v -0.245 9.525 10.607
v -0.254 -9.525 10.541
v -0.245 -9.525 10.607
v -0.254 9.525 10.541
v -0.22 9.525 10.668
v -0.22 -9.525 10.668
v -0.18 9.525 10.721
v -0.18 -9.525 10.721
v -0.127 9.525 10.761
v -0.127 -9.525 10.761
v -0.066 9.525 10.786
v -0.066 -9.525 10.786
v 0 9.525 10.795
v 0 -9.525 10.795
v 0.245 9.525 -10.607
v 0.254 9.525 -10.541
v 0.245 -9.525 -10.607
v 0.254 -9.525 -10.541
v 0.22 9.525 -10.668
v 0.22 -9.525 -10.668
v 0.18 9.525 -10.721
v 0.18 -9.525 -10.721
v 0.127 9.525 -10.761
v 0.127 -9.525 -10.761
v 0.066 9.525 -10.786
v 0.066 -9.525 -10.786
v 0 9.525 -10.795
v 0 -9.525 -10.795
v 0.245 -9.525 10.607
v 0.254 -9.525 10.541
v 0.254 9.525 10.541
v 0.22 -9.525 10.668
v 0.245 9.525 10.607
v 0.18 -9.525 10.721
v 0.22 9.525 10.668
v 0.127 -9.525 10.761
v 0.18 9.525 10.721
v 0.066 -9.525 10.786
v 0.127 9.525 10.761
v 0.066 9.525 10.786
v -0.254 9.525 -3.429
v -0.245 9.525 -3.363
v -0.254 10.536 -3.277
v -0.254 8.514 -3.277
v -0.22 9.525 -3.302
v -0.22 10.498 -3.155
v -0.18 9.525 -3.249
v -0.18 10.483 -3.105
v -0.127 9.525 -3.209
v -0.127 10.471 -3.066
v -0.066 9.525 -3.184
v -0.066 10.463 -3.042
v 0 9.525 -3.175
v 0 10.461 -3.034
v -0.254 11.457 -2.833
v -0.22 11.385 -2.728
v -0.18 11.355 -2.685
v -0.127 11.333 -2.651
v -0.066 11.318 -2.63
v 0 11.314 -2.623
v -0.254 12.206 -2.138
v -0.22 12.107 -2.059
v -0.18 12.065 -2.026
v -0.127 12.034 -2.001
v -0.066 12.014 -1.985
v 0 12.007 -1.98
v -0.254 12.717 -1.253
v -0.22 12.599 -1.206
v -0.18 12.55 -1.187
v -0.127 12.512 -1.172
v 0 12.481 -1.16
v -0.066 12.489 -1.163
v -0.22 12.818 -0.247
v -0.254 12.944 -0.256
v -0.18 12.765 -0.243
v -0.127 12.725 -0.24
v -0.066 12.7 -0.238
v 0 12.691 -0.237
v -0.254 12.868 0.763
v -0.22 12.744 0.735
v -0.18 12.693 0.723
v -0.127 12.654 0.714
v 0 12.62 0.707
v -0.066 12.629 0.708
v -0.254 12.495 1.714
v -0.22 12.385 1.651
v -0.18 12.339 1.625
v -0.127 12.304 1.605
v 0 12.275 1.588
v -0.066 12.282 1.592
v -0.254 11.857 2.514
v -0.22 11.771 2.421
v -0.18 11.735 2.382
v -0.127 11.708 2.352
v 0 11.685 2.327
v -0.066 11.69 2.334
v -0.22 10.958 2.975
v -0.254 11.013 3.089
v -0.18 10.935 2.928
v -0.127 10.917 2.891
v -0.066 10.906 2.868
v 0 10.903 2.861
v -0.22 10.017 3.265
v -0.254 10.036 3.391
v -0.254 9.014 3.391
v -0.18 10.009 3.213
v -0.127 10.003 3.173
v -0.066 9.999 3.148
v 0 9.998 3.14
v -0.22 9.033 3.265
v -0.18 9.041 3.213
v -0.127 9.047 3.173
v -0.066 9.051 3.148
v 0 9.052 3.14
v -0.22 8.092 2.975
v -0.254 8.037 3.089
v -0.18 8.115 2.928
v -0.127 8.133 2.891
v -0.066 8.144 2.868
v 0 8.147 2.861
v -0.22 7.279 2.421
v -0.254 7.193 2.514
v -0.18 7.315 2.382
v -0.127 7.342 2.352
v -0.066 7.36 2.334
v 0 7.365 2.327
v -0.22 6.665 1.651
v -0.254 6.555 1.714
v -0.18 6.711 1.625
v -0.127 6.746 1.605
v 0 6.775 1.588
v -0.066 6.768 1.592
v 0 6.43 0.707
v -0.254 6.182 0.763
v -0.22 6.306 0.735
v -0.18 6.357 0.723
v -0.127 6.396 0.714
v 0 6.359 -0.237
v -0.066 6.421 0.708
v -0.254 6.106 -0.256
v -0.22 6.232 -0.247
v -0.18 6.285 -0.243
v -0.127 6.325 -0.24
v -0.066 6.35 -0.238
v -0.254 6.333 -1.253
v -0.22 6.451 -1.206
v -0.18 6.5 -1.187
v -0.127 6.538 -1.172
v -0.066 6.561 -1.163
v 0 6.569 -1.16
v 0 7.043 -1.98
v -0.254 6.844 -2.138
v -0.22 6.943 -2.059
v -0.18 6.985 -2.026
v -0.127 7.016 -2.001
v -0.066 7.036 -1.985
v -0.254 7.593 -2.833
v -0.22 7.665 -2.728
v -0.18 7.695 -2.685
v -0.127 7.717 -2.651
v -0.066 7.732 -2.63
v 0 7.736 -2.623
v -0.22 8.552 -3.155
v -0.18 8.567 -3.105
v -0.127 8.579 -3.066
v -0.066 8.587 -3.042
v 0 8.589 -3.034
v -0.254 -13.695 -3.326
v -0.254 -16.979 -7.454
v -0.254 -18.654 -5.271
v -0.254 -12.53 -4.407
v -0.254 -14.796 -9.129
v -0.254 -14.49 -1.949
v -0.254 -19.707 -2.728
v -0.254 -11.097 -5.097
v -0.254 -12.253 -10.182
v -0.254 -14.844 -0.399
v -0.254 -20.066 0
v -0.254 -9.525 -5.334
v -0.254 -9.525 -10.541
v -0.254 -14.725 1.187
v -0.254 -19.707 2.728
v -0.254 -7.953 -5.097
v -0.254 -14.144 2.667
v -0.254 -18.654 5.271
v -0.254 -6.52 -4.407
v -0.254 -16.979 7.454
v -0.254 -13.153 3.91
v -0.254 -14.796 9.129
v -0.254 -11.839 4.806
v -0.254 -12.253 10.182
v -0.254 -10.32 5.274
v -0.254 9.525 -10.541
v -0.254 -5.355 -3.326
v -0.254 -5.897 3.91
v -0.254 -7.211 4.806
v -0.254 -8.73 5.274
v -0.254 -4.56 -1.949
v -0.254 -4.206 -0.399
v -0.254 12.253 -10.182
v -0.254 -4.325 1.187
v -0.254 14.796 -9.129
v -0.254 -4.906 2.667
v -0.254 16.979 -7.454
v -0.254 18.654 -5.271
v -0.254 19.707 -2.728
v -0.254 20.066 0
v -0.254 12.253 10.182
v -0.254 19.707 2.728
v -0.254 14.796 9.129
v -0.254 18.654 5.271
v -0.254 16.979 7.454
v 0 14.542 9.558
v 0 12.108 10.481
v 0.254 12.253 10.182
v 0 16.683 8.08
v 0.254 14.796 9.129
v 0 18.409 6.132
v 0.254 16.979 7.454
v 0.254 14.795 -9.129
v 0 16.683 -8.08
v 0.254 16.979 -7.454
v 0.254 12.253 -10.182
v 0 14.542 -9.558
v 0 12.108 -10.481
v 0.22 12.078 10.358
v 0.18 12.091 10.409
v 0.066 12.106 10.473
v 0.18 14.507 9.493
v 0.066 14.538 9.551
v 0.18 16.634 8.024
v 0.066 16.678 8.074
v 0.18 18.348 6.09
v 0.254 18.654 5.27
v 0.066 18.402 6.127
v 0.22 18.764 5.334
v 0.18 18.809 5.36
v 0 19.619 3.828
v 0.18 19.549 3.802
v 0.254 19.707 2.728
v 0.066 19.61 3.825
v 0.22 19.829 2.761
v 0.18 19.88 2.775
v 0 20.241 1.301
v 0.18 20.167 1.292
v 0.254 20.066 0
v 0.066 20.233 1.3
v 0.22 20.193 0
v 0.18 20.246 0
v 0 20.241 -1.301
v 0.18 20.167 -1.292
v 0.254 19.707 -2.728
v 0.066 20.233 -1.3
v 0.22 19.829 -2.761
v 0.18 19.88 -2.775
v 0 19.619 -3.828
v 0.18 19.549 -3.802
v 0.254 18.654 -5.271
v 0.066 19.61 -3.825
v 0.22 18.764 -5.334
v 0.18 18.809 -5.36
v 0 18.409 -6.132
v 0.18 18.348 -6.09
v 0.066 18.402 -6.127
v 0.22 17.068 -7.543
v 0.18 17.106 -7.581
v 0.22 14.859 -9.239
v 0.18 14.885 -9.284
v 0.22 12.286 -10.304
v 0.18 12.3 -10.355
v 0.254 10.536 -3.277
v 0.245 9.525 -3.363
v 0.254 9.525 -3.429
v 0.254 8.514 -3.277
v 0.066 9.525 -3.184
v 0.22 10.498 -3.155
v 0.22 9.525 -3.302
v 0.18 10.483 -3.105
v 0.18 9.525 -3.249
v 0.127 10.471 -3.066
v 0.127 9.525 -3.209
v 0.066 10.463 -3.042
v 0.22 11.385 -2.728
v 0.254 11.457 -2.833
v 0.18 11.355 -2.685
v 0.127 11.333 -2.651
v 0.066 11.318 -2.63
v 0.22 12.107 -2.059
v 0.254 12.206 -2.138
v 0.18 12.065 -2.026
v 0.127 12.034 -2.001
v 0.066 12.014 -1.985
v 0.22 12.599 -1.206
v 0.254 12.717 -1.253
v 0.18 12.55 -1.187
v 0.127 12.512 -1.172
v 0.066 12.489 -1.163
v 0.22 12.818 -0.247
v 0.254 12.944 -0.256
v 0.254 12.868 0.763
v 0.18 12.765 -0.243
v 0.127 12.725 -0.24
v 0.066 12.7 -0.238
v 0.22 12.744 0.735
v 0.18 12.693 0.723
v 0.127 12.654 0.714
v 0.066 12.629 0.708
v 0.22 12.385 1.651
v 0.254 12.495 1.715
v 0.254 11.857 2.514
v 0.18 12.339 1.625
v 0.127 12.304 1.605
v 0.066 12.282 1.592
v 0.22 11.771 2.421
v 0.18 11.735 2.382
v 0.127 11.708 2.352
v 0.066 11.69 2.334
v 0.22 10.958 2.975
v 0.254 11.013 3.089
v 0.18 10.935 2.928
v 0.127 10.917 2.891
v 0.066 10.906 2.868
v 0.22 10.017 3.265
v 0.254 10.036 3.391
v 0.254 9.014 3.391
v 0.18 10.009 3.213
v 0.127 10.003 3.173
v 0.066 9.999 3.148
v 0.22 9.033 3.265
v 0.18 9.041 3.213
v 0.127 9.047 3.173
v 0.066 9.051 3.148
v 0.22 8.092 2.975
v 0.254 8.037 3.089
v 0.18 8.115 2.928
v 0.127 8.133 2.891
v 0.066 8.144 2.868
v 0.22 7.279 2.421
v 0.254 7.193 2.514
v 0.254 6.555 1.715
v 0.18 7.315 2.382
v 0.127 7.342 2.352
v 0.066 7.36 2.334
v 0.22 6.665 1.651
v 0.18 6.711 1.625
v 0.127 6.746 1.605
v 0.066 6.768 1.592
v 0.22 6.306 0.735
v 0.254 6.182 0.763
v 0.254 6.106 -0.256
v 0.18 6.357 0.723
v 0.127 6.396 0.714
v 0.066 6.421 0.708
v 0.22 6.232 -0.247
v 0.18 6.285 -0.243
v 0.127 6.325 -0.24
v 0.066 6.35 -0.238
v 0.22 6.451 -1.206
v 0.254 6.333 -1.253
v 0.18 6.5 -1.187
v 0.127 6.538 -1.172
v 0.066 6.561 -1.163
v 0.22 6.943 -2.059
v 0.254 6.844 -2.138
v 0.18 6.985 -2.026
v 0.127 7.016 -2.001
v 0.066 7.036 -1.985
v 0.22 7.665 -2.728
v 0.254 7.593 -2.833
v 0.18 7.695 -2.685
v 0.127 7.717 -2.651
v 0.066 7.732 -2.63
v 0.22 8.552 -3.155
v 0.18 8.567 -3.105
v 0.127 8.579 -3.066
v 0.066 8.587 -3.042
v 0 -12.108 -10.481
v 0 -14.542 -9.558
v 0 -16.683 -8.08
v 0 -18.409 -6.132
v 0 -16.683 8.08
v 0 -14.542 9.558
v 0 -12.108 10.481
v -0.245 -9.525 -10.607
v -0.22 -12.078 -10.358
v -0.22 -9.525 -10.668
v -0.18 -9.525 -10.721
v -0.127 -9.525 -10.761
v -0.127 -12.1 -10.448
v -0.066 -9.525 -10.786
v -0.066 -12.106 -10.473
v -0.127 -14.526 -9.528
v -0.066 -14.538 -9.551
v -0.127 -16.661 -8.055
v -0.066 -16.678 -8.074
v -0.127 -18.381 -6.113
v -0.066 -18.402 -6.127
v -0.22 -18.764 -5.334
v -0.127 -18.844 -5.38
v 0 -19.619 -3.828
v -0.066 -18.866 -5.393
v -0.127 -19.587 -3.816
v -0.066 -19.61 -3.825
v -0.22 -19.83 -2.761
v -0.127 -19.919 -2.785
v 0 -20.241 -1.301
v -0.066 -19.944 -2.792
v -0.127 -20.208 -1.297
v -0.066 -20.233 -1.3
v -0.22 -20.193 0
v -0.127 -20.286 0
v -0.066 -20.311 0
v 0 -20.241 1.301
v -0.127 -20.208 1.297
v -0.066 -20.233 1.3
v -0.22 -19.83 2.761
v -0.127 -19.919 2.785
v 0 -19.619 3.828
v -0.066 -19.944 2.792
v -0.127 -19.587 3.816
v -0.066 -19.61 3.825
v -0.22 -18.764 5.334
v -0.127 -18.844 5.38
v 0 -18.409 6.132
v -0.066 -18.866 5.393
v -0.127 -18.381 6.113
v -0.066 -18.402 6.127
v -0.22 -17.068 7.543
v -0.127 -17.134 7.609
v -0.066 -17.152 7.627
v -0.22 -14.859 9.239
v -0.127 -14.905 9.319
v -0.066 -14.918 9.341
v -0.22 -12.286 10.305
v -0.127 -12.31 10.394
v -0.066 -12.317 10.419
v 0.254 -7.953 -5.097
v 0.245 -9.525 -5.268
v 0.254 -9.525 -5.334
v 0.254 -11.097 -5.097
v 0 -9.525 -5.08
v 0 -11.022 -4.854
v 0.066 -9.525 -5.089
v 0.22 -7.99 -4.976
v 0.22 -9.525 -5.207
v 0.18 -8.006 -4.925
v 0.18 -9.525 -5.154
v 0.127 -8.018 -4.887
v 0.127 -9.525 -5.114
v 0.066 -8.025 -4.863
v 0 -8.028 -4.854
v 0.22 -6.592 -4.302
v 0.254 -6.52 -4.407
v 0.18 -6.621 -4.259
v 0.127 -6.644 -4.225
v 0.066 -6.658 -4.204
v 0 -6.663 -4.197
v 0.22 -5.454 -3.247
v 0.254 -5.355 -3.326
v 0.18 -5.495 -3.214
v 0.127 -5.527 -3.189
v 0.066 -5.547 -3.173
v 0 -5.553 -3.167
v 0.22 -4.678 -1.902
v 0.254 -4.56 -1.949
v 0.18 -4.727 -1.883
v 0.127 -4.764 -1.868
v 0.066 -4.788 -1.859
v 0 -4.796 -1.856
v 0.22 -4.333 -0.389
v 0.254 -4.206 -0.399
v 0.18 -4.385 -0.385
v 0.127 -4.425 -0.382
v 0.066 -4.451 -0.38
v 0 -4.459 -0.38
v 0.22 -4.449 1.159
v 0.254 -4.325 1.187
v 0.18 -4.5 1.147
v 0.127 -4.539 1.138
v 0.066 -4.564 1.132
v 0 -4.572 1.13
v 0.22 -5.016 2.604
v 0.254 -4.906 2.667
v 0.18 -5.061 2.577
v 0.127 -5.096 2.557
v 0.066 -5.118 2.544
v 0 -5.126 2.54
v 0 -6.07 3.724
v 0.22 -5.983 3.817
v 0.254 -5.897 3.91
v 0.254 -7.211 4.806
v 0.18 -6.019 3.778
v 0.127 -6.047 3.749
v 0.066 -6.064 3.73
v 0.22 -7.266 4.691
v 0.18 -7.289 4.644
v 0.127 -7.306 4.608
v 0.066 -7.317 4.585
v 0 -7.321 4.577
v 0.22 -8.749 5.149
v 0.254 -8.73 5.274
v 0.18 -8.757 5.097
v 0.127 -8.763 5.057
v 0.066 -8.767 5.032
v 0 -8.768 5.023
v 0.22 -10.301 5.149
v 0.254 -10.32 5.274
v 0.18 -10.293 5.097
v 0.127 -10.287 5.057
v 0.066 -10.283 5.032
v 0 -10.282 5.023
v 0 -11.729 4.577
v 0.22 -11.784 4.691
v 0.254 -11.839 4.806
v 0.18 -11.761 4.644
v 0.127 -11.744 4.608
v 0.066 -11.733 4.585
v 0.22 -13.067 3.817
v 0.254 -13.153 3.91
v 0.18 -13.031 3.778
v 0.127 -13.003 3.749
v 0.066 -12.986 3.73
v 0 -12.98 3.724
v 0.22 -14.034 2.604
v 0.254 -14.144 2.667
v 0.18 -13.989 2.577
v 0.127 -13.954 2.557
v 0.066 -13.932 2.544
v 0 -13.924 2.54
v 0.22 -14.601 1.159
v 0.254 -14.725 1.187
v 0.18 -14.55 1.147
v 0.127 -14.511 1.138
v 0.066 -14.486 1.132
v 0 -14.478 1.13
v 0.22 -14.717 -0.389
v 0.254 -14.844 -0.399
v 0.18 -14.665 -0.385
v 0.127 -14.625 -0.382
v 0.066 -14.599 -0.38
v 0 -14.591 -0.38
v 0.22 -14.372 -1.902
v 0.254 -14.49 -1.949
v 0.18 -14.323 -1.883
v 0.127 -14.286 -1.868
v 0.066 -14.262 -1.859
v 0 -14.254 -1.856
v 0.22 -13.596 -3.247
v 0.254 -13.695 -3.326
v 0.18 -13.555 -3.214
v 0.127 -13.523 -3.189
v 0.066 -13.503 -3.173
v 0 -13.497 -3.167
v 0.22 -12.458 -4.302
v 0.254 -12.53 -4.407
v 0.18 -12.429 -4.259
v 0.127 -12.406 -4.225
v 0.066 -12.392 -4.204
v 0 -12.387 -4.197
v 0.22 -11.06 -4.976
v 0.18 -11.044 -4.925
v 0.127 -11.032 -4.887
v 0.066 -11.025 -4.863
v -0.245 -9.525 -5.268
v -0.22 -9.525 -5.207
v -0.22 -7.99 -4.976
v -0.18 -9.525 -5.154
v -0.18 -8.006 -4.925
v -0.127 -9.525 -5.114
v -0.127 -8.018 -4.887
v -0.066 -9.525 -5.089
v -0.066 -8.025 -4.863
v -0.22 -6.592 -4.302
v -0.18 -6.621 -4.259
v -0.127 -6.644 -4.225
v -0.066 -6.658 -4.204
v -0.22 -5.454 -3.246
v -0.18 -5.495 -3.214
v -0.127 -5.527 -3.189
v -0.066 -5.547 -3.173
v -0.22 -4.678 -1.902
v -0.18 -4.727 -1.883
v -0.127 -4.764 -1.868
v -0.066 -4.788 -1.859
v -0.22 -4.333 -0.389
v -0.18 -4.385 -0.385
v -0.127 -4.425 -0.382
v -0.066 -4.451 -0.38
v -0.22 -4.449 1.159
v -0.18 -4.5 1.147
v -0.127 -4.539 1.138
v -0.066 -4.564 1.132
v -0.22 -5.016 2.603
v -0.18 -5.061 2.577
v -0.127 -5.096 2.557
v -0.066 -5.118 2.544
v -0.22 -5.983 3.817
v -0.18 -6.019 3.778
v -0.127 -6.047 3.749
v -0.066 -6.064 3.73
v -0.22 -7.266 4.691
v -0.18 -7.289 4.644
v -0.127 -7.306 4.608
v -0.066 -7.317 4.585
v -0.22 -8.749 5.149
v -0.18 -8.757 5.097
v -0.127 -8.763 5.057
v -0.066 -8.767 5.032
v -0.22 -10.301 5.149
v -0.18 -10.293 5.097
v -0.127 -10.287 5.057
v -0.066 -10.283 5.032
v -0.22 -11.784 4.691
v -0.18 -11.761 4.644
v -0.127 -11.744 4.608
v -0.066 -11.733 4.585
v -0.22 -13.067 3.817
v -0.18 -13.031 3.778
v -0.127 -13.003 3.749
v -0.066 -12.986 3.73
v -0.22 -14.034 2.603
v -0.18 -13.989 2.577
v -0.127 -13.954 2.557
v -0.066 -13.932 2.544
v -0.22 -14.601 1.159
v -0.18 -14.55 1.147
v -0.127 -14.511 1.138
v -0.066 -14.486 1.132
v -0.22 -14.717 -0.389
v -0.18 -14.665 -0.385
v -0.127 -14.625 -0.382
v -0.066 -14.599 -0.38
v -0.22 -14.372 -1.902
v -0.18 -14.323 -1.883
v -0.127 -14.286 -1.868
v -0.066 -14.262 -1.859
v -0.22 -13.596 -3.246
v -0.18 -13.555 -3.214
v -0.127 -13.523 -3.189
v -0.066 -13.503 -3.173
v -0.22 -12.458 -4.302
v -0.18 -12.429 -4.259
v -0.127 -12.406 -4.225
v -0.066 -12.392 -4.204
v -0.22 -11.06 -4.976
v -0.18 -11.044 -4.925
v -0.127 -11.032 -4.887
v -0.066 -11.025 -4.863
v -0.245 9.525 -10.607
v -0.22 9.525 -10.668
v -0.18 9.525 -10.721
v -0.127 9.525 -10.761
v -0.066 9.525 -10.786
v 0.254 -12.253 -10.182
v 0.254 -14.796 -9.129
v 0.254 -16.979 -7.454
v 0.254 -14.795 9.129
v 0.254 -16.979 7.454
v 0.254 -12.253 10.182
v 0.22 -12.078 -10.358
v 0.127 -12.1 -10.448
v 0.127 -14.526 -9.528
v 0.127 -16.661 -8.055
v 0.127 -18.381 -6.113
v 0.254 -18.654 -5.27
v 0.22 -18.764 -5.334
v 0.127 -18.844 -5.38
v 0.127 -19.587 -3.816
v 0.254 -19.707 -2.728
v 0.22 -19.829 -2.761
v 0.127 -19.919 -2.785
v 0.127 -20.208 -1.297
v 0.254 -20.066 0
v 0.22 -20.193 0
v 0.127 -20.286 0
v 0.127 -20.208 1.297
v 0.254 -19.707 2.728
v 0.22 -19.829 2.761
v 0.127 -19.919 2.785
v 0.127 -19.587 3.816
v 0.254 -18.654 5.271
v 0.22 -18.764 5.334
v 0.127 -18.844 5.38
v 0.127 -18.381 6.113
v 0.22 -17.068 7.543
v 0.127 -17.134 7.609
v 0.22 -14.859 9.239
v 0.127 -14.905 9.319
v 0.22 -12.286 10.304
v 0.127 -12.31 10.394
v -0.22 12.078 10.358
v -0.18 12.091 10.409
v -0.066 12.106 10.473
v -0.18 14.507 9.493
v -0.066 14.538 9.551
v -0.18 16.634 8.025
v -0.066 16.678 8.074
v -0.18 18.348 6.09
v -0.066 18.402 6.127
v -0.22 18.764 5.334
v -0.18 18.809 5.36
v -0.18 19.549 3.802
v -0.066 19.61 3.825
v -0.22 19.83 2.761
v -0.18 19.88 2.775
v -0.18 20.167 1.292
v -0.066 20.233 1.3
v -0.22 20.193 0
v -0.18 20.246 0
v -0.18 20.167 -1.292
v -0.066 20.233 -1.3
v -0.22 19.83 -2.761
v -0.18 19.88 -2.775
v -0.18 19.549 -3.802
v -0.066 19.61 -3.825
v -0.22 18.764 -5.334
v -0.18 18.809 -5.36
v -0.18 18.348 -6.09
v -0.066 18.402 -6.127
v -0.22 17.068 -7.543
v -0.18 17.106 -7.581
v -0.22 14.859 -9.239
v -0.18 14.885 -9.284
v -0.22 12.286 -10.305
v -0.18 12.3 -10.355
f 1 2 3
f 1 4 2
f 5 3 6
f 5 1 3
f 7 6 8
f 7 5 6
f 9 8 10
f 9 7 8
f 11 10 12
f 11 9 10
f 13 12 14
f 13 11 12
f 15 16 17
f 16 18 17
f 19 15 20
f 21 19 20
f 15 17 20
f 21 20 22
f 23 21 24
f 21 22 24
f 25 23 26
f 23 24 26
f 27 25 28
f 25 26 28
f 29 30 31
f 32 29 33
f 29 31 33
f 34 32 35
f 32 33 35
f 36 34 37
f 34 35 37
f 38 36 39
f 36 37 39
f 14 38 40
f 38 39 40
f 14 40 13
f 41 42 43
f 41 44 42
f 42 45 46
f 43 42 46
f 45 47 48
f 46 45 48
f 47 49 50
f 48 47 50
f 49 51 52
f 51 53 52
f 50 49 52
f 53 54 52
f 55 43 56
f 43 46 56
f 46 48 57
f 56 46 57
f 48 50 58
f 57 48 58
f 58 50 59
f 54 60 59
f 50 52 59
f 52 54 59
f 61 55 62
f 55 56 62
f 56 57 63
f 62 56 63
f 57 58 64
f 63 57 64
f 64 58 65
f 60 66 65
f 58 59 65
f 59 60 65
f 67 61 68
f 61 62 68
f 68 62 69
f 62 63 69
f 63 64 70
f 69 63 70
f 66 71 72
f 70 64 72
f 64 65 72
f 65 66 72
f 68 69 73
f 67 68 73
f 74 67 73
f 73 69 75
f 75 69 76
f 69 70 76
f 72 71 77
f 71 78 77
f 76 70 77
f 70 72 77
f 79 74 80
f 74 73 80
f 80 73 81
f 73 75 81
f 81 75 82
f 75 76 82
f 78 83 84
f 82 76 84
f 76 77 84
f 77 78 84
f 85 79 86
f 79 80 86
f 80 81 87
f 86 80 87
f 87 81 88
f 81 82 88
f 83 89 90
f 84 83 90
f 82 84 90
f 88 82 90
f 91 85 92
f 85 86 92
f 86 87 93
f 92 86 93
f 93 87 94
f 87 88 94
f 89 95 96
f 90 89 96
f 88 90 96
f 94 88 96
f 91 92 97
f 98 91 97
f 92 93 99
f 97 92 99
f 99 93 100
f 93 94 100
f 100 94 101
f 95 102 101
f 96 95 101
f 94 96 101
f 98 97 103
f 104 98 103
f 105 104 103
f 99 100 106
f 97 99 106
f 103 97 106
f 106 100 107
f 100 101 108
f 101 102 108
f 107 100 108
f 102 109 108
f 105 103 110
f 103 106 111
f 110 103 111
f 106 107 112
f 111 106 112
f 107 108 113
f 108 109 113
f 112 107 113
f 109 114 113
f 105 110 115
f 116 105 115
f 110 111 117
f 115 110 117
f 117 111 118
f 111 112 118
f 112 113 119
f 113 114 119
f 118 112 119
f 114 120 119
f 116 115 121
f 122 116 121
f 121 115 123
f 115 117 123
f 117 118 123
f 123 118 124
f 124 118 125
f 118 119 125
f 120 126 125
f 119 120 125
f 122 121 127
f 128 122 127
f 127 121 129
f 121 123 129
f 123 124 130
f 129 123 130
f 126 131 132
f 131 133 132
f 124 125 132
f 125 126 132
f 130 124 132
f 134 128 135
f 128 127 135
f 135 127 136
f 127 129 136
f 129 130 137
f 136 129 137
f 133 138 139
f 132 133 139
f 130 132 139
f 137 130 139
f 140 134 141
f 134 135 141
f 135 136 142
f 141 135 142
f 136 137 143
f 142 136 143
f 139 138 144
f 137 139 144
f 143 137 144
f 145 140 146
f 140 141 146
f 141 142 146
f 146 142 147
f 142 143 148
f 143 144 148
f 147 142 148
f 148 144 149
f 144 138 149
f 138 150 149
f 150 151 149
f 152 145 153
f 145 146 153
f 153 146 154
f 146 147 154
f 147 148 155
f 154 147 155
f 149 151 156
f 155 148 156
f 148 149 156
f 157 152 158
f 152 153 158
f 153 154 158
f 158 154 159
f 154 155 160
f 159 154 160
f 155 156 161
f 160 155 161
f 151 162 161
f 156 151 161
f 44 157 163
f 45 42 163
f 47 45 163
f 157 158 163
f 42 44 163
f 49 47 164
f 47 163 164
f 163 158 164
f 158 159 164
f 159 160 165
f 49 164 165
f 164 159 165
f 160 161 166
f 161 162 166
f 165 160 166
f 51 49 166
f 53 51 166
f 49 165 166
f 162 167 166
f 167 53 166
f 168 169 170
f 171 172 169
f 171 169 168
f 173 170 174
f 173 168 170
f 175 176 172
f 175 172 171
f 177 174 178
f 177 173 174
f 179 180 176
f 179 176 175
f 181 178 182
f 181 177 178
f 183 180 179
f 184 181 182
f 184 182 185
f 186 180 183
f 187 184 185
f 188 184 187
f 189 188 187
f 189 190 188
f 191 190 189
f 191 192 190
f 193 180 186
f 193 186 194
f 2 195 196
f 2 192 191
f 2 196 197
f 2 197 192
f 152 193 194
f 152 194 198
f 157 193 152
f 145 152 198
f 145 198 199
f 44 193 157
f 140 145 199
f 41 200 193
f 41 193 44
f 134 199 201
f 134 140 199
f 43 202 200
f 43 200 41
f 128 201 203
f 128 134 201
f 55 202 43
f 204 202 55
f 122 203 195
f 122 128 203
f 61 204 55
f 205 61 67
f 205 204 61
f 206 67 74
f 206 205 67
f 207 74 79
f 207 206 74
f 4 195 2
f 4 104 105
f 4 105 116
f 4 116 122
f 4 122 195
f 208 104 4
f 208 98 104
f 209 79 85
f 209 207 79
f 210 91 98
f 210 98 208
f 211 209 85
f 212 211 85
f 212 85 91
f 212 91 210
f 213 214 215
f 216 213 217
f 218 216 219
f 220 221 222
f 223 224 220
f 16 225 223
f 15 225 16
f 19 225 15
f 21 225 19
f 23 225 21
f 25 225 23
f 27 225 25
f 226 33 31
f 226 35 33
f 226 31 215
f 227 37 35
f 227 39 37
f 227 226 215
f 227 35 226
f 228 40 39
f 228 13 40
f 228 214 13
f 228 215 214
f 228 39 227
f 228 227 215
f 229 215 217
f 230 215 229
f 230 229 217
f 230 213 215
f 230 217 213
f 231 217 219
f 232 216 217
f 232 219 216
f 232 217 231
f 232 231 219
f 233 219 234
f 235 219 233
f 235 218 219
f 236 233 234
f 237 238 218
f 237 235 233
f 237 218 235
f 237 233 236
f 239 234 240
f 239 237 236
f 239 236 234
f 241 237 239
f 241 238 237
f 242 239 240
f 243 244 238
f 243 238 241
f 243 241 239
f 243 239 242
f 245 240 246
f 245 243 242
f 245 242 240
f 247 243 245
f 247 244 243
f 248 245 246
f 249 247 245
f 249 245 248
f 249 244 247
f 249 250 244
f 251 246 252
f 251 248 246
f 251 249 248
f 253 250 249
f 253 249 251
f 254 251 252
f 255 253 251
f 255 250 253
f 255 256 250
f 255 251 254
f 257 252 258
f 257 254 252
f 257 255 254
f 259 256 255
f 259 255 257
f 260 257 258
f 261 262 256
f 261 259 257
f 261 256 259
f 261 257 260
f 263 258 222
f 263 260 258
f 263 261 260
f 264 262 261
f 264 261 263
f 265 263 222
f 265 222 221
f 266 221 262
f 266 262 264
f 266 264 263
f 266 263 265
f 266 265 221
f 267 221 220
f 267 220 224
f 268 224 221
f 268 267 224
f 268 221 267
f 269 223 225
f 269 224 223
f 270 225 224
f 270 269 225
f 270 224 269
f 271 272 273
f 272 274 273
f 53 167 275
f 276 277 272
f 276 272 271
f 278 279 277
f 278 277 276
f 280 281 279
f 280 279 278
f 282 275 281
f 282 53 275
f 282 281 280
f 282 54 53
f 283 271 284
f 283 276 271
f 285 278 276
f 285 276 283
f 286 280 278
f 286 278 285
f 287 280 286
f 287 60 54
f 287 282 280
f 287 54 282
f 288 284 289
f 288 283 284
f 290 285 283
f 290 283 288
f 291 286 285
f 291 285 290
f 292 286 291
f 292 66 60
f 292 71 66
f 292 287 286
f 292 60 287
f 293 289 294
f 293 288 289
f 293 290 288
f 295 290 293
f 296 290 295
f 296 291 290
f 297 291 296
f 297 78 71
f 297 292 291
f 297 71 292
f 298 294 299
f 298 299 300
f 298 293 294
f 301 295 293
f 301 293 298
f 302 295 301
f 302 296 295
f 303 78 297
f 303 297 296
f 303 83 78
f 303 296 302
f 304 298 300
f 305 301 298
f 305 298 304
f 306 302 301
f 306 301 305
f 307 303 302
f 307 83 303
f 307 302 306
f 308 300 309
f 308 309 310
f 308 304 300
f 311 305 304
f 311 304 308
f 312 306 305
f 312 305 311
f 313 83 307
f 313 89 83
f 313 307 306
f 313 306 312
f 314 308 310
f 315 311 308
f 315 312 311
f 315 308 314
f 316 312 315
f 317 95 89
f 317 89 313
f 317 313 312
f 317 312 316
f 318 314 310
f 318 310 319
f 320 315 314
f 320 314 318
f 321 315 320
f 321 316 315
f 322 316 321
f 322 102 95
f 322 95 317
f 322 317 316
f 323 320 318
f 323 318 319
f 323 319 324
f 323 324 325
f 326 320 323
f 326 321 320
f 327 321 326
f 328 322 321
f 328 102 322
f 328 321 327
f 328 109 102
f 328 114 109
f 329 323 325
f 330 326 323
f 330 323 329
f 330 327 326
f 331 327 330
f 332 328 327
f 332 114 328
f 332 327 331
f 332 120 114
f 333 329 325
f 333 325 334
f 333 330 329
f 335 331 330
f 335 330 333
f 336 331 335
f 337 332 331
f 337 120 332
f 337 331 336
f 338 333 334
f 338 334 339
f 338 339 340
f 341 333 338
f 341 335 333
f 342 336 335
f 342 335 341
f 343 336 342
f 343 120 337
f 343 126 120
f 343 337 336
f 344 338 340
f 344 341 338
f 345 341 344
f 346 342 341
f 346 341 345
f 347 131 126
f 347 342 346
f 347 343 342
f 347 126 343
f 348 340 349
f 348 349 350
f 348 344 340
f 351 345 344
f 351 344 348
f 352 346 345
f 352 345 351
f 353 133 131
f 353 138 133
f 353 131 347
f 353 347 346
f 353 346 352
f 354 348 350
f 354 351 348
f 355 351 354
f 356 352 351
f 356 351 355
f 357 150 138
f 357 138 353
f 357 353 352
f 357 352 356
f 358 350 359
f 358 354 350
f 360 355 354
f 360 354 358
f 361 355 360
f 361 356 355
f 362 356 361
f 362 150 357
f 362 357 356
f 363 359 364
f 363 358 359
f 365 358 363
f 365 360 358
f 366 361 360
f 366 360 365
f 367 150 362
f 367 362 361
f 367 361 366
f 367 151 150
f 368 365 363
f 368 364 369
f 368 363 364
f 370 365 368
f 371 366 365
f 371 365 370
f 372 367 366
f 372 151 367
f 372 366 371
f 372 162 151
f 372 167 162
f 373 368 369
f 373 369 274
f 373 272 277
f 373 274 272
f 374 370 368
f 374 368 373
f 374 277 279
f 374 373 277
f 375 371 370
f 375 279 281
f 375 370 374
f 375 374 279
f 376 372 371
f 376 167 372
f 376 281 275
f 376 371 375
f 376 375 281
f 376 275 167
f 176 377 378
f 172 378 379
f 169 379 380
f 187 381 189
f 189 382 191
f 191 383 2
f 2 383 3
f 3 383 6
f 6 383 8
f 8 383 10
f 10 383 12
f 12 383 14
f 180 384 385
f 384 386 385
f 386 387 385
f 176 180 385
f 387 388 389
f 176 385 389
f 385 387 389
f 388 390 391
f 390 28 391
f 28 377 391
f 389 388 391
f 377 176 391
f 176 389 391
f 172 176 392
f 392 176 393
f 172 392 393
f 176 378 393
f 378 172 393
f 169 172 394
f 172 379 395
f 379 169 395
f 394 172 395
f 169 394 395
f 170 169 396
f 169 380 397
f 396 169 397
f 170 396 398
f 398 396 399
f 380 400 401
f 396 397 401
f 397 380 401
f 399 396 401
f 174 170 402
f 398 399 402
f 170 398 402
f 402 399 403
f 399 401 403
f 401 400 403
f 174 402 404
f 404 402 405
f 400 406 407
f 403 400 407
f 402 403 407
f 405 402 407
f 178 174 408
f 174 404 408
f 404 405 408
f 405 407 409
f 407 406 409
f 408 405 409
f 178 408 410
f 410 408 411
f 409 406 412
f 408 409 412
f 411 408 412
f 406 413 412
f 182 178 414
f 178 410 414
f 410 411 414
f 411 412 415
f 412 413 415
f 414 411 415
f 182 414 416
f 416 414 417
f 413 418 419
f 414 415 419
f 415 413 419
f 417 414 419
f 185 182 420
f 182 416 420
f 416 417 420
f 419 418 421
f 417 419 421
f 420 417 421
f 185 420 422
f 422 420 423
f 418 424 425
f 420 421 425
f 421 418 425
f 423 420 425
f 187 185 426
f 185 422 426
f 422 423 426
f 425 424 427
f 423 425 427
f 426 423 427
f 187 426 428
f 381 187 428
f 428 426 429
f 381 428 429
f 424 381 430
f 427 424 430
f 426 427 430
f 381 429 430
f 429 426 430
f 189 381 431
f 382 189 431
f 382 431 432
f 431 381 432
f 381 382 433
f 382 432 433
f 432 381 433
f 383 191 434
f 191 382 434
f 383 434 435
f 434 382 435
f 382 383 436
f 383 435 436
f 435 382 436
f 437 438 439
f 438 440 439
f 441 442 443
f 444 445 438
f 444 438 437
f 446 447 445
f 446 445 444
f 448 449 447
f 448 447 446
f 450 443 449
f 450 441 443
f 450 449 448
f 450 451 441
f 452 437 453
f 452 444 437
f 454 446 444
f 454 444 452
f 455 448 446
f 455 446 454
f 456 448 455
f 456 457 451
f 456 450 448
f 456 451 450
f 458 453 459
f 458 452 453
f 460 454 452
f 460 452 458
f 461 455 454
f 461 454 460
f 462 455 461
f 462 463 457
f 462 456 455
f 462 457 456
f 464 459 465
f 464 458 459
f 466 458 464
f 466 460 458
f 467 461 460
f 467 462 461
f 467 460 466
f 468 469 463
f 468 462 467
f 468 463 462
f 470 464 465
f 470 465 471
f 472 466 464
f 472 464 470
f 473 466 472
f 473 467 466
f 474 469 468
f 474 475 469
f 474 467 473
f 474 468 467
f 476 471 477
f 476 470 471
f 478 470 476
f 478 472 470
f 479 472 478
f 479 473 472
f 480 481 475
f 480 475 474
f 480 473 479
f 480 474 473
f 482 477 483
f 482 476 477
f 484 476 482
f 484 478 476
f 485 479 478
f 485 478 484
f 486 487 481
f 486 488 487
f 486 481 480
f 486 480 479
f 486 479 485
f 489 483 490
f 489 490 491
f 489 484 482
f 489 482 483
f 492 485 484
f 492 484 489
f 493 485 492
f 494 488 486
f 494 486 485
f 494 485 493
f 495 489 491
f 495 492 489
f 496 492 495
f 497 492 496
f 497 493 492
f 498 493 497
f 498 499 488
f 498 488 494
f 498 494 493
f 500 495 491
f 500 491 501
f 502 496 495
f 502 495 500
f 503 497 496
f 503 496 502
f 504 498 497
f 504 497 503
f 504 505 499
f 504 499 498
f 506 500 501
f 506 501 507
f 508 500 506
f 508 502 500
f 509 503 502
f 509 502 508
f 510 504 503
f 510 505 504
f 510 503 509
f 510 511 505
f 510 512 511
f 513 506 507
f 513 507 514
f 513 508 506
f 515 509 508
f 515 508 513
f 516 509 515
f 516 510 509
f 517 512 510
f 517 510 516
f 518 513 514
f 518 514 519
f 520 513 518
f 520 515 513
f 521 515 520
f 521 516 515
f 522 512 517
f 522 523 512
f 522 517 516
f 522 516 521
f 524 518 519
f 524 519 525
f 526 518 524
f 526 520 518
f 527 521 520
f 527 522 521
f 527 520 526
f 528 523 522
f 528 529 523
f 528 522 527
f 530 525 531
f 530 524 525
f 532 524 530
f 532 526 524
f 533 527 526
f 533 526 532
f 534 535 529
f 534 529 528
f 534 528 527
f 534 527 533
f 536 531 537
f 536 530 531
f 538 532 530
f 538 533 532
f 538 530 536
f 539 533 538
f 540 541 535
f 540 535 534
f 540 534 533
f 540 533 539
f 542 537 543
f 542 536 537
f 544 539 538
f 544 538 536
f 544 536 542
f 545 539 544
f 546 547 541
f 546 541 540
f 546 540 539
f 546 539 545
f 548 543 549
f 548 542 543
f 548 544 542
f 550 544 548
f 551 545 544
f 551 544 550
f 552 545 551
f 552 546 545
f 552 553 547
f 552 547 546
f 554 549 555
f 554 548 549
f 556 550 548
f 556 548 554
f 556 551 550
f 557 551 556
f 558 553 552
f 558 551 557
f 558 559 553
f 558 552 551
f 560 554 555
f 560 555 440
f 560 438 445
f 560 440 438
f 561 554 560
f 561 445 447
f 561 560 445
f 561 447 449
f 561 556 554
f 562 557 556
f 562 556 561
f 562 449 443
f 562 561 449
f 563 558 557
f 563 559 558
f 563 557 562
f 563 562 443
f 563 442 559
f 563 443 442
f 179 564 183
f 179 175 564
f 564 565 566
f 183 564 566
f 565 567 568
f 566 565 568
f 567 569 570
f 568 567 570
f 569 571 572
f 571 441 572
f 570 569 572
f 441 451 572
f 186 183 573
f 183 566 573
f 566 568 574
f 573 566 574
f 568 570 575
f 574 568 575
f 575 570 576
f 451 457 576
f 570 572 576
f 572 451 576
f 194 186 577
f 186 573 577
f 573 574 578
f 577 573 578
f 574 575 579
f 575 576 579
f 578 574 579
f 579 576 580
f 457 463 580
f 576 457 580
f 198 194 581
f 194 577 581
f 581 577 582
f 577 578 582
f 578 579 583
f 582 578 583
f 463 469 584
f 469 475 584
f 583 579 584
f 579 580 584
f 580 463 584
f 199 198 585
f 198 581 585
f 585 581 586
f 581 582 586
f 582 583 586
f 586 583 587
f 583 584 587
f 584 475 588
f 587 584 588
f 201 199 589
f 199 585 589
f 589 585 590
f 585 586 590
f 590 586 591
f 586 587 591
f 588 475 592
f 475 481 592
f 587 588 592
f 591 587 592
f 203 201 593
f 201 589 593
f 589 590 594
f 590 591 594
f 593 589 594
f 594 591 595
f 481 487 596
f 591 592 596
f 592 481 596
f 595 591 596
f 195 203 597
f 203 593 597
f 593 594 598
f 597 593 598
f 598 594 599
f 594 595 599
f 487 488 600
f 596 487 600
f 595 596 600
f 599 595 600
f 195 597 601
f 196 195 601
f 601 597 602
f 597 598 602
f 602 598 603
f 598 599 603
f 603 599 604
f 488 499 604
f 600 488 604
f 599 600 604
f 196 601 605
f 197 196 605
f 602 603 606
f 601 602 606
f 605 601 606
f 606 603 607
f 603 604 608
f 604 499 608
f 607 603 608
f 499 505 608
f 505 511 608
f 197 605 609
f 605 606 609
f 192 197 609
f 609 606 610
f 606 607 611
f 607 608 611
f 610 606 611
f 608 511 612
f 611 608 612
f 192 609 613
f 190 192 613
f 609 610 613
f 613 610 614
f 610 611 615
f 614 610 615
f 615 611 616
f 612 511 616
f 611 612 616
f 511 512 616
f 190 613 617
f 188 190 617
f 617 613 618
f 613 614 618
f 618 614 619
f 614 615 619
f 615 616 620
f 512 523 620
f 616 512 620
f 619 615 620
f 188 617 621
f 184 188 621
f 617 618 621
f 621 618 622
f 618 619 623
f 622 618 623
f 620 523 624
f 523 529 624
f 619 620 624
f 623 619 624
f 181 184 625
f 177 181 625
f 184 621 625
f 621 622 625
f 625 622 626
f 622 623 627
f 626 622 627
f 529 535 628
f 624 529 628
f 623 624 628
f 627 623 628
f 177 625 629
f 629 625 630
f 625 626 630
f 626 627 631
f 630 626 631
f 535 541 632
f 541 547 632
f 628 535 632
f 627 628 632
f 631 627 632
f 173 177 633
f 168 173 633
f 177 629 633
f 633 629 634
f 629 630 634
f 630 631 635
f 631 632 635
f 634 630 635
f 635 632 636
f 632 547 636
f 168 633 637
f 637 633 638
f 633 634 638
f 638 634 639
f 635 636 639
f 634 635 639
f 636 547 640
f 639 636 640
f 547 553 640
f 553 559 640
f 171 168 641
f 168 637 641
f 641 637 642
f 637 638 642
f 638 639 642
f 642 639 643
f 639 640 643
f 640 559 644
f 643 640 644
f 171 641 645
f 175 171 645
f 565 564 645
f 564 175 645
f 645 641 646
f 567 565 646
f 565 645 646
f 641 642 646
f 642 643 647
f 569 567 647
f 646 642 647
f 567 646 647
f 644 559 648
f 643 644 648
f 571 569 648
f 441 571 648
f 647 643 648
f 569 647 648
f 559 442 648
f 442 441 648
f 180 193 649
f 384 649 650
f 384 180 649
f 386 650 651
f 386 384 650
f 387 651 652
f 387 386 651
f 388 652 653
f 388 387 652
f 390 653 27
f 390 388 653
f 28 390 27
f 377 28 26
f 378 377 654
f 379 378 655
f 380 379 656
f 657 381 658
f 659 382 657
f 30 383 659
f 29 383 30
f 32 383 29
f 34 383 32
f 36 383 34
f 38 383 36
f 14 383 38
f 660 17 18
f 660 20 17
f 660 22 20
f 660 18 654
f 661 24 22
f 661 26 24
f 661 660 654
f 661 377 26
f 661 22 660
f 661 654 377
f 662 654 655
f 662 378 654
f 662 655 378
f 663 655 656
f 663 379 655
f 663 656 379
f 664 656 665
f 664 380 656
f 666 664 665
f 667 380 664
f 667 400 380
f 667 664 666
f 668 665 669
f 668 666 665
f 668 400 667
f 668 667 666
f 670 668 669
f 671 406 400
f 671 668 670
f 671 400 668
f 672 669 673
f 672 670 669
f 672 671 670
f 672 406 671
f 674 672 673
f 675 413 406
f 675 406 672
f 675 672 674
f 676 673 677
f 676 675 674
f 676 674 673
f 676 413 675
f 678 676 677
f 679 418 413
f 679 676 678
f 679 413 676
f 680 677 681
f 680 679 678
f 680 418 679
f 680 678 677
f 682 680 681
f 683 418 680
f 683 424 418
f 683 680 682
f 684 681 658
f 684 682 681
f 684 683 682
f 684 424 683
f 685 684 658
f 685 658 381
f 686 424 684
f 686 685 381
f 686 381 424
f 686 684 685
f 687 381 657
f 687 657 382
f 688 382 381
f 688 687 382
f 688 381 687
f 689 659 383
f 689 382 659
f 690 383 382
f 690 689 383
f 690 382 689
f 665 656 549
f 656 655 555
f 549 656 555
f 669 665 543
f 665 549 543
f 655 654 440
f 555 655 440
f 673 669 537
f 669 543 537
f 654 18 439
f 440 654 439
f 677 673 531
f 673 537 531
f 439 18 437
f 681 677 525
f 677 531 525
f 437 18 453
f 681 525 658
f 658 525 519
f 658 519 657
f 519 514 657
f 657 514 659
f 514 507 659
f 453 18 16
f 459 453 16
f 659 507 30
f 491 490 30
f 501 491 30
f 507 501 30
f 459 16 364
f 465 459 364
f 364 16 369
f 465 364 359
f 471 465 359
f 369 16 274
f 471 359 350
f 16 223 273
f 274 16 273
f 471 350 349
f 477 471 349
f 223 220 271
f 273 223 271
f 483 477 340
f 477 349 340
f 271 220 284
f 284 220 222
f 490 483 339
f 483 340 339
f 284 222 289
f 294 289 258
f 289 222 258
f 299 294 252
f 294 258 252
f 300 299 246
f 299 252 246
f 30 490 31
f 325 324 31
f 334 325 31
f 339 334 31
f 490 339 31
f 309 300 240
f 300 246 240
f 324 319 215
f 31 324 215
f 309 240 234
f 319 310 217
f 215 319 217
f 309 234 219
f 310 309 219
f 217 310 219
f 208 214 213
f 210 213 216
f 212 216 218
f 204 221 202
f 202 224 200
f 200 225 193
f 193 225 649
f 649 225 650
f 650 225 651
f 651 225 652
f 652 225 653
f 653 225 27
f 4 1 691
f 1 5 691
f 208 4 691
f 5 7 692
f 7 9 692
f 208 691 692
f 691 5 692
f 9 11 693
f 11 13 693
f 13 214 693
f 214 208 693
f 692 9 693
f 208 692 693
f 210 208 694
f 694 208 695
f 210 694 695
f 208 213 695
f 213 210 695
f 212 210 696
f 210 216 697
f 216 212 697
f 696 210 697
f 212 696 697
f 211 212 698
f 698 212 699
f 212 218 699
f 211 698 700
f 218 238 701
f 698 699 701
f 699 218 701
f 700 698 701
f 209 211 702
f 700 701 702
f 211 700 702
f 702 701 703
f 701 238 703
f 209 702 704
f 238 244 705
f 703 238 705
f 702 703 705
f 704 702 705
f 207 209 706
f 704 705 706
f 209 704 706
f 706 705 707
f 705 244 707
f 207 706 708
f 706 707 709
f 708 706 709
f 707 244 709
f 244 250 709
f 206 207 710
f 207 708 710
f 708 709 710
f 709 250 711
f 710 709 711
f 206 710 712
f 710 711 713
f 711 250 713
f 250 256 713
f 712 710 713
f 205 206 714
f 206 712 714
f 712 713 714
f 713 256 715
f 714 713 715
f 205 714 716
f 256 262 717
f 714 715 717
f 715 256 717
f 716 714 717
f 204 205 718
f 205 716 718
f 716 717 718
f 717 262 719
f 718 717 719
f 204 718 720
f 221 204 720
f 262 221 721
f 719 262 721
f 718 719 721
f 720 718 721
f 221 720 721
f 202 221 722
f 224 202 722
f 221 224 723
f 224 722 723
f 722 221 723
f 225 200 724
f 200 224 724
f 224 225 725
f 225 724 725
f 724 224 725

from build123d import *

# Parameters (mm, degrees)
SKETCH2_R           = 3.175
SKETCH2_R_2         = 5.08
BOSS_EXTRUDE1_DEPTH = 0.254
FILLET1_R           = 0.254
FILLET2_R           = 0.254


with BuildPart() as part:
    # Sketch2 → Boss-Extrude1 (new, symmetric)
    with BuildSketch(Plane(origin=(0, 0, 0), x_dir=(0, 0, -1), z_dir=(1, 0, 0))):
        with BuildLine():
            Line((10.795, 9.525), (10.795, -9.525))
            ThreePointArc((10.795, -9.525), (0, -20.32), (-10.795, -9.525))
            Line((-10.795, -9.525), (-10.795, 9.525))
            ThreePointArc((-10.795, 9.525), (0, 20.32), (10.795, 9.525))
        make_face()
        with Locations((0, 9.525)):
            Circle(SKETCH2_R, mode=Mode.SUBTRACT)
        with Locations((0, -9.525)):
            Circle(SKETCH2_R_2, mode=Mode.SUBTRACT)
    extrude(amount=BOSS_EXTRUDE1_DEPTH, both=True)

    # Fillet1
    fillet1_edges = [part.edges().sort_by_distance(p)[0] for p in [
        (0.254, -20.32, 0),
        (0.254, 9.525, 3.175),
        (0.254, 0, -10.795),
        (0.254, -9.525, 5.08),
        (0.254, 20.32, 0),
        (0.254, 0, 10.795),
    ]]
    fillet(fillet1_edges, radius=FILLET1_R)

    # Fillet2
    fillet2_edges = [part.edges().sort_by_distance(p)[0] for p in [
        (-0.254, -9.525, 5.08),
        (-0.254, 9.525, 3.175),
        (-0.254, 0, 10.795),
        (-0.254, -20.32, 0),
        (-0.254, 0, -10.795),
        (-0.254, 20.32, 0),
    ]]
    fillet(fillet2_edges, radius=FILLET2_R - 0.0001)  # a hair under: the kernel refuses the full size


solid = part.part
